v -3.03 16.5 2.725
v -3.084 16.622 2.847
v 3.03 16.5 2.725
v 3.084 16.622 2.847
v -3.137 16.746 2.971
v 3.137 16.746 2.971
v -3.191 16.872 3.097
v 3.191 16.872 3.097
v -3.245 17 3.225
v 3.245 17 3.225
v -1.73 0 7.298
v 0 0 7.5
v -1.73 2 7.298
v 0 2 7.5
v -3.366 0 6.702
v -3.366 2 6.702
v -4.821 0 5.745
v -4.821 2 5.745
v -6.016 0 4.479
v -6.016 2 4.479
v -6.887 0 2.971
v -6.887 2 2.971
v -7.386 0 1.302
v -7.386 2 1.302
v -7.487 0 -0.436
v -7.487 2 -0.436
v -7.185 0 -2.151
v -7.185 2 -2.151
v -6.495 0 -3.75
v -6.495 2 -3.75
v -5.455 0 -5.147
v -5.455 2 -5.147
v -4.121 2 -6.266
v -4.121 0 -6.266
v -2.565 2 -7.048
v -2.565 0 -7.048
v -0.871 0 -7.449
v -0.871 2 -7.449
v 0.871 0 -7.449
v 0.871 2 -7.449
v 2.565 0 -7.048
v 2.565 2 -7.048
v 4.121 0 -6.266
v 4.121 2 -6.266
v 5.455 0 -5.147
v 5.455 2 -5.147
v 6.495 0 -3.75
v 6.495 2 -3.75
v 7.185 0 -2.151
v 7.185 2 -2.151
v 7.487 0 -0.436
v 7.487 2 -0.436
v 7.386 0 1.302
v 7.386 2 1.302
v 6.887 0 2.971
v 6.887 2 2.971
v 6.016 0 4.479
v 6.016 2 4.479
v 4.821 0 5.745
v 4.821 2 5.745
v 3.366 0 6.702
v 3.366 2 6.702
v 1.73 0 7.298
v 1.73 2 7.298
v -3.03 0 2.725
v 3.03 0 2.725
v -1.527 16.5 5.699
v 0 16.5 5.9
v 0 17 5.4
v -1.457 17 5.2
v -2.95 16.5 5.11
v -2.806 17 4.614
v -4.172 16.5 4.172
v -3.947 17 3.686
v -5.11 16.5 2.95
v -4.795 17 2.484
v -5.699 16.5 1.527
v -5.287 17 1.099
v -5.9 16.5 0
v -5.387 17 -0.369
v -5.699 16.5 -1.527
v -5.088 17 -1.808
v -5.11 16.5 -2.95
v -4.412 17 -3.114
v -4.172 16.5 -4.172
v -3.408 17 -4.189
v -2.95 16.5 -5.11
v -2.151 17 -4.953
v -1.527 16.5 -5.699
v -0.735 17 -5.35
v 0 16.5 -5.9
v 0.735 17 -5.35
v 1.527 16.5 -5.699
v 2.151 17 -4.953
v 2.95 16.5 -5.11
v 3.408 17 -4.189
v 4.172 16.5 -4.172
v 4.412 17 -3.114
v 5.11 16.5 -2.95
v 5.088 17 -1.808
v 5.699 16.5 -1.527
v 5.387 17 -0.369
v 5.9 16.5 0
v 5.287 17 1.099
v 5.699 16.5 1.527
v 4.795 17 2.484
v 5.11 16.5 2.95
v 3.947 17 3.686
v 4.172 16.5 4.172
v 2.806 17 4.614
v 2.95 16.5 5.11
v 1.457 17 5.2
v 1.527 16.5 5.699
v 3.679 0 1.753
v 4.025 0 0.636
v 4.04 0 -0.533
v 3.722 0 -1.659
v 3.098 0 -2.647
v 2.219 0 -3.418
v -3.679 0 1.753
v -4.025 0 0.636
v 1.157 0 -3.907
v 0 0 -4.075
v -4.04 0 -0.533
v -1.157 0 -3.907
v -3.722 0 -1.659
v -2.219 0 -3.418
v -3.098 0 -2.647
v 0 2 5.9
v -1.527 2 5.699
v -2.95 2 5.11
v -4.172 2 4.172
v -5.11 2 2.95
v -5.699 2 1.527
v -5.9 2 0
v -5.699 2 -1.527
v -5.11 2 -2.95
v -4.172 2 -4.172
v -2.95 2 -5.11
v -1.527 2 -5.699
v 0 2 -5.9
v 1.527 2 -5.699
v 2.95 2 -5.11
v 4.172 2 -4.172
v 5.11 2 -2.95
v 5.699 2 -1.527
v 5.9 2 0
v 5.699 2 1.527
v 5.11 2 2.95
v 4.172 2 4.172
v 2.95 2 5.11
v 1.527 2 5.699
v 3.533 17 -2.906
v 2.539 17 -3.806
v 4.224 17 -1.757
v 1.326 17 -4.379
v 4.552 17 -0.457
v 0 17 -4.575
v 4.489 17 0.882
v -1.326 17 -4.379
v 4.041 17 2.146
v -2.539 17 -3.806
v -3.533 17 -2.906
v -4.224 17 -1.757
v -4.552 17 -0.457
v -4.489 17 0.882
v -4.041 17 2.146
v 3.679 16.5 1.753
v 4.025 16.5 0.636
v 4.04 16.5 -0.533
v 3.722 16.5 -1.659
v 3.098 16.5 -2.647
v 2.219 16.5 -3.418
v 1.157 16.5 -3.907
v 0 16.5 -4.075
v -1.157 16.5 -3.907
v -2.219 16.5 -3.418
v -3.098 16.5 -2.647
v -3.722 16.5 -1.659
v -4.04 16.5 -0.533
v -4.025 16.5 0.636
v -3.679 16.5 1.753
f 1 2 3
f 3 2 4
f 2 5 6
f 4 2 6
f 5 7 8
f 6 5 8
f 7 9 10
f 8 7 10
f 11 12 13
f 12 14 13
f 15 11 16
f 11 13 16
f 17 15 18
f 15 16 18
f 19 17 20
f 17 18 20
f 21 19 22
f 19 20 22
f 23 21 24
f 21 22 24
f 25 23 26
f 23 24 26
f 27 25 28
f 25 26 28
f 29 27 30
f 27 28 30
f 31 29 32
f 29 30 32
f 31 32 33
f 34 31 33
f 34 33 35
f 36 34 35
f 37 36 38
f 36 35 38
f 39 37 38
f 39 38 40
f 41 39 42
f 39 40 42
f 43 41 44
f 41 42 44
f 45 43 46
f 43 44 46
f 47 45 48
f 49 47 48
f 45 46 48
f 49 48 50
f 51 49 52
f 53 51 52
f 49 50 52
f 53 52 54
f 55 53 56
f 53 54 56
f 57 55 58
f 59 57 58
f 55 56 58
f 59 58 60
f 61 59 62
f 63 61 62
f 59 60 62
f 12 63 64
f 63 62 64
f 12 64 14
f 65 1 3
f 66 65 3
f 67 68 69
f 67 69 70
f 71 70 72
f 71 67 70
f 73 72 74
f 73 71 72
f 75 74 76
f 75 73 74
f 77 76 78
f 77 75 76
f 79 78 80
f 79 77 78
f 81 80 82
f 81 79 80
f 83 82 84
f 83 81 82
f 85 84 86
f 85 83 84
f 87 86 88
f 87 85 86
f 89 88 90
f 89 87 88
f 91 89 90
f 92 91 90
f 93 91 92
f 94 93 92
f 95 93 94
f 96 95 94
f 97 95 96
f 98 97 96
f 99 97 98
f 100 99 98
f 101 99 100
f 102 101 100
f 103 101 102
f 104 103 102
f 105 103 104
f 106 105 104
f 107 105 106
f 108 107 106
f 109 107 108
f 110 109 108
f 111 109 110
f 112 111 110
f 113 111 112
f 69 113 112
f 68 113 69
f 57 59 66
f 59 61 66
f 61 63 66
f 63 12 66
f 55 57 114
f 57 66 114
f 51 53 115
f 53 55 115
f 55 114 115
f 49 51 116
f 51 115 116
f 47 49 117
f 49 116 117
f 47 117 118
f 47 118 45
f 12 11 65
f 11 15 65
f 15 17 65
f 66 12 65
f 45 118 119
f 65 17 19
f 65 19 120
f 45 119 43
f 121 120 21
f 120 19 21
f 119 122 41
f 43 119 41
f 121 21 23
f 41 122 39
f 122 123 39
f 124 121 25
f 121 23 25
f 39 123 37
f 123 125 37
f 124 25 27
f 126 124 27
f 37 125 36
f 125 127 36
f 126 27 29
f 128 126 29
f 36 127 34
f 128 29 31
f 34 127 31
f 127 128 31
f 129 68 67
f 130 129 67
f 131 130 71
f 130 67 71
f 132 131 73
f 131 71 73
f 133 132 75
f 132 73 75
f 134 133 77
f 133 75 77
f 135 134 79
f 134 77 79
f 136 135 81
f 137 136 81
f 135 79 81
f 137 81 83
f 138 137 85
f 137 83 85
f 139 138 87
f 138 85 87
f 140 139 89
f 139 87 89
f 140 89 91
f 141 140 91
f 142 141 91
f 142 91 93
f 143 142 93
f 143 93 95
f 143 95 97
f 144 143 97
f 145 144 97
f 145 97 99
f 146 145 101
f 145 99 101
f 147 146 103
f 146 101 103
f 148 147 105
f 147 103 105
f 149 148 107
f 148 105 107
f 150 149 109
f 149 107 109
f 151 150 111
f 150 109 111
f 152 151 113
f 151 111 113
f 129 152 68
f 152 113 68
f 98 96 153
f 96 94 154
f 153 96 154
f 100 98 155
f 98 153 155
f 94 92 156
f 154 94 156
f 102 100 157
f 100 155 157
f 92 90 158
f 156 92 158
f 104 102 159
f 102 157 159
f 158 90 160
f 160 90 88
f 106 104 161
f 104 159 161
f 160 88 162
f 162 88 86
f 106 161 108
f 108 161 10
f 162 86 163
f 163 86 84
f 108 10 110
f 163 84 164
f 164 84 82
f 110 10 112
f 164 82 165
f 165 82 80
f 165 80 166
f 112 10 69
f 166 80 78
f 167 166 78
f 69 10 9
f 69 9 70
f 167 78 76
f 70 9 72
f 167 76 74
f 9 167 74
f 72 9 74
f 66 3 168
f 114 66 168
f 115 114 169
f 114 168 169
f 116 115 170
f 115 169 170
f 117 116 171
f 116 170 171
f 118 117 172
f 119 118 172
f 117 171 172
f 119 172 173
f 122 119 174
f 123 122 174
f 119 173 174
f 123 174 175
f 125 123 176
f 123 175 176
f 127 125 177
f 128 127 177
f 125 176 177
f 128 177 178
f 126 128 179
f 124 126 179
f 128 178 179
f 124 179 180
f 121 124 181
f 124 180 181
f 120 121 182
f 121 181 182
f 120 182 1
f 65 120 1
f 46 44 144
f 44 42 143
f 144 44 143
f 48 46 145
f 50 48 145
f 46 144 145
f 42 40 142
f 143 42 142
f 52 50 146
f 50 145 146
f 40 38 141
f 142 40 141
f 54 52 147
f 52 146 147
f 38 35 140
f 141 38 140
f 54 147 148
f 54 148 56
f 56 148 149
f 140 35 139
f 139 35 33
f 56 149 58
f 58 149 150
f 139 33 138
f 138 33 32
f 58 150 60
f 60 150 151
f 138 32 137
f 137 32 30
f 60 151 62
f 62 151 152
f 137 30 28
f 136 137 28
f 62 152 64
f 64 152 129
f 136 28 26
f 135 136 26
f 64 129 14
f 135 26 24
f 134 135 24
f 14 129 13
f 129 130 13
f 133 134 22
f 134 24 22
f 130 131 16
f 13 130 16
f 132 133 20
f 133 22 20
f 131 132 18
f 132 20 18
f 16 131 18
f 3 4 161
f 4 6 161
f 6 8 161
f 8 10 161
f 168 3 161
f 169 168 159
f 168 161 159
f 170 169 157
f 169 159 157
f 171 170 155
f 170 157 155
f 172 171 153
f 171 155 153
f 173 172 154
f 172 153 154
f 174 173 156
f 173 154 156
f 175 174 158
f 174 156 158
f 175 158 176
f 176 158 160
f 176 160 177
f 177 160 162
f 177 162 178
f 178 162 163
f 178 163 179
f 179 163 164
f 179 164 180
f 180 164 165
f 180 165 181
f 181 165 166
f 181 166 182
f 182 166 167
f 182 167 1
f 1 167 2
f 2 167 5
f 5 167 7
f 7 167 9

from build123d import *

# Parameters (mm, degrees)
SCHNITT_LINEAR_AUSTRAGEN1_DEPTH = 21.03746491
FASE1_SIZE                      = 0.5


with BuildPart() as part:
    # Skizze1 → Rotation1 (revolve)
    with BuildSketch(Plane.XY, mode=Mode.PRIVATE) as rotation1_sk:
        Polygon((0, 0), (7.5, 0), (7.5, 2), (5.9, 2), (5.9, 17), (0, 17), align=None)
    revolve(rotation1_sk.sketch.rotate(Axis((0, 0, 0), (0, -1, 0)), 90), axis=Axis((0, 0, 0), (0, -1, 0)))

    # Skizze2 → Schnitt-Linear austragen1 (cut, through all)
    with BuildSketch(Plane(origin=(0, 17, 0), x_dir=(1, 0, 0), z_dir=(0, 1, 0))):
        with BuildLine():
            Line((-3.029851482, -2.725), (3.029851482, -2.725))
            ThreePointArc((3.029851482, -2.725), (0, 4.075), (-3.029851482, -2.725))
        make_face()
    extrude(amount=-SCHNITT_LINEAR_AUSTRAGEN1_DEPTH, mode=Mode.SUBTRACT)

    # Fase1
    fase1_edges = [part.edges().sort_by_distance(p)[0] for p in [
        (0, 17, -4.075),
        (0, 17, 2.725),
        (0, 17, -5.9),
    ]]
    chamfer(fase1_edges, length=FASE1_SIZE)


solid = part.part
